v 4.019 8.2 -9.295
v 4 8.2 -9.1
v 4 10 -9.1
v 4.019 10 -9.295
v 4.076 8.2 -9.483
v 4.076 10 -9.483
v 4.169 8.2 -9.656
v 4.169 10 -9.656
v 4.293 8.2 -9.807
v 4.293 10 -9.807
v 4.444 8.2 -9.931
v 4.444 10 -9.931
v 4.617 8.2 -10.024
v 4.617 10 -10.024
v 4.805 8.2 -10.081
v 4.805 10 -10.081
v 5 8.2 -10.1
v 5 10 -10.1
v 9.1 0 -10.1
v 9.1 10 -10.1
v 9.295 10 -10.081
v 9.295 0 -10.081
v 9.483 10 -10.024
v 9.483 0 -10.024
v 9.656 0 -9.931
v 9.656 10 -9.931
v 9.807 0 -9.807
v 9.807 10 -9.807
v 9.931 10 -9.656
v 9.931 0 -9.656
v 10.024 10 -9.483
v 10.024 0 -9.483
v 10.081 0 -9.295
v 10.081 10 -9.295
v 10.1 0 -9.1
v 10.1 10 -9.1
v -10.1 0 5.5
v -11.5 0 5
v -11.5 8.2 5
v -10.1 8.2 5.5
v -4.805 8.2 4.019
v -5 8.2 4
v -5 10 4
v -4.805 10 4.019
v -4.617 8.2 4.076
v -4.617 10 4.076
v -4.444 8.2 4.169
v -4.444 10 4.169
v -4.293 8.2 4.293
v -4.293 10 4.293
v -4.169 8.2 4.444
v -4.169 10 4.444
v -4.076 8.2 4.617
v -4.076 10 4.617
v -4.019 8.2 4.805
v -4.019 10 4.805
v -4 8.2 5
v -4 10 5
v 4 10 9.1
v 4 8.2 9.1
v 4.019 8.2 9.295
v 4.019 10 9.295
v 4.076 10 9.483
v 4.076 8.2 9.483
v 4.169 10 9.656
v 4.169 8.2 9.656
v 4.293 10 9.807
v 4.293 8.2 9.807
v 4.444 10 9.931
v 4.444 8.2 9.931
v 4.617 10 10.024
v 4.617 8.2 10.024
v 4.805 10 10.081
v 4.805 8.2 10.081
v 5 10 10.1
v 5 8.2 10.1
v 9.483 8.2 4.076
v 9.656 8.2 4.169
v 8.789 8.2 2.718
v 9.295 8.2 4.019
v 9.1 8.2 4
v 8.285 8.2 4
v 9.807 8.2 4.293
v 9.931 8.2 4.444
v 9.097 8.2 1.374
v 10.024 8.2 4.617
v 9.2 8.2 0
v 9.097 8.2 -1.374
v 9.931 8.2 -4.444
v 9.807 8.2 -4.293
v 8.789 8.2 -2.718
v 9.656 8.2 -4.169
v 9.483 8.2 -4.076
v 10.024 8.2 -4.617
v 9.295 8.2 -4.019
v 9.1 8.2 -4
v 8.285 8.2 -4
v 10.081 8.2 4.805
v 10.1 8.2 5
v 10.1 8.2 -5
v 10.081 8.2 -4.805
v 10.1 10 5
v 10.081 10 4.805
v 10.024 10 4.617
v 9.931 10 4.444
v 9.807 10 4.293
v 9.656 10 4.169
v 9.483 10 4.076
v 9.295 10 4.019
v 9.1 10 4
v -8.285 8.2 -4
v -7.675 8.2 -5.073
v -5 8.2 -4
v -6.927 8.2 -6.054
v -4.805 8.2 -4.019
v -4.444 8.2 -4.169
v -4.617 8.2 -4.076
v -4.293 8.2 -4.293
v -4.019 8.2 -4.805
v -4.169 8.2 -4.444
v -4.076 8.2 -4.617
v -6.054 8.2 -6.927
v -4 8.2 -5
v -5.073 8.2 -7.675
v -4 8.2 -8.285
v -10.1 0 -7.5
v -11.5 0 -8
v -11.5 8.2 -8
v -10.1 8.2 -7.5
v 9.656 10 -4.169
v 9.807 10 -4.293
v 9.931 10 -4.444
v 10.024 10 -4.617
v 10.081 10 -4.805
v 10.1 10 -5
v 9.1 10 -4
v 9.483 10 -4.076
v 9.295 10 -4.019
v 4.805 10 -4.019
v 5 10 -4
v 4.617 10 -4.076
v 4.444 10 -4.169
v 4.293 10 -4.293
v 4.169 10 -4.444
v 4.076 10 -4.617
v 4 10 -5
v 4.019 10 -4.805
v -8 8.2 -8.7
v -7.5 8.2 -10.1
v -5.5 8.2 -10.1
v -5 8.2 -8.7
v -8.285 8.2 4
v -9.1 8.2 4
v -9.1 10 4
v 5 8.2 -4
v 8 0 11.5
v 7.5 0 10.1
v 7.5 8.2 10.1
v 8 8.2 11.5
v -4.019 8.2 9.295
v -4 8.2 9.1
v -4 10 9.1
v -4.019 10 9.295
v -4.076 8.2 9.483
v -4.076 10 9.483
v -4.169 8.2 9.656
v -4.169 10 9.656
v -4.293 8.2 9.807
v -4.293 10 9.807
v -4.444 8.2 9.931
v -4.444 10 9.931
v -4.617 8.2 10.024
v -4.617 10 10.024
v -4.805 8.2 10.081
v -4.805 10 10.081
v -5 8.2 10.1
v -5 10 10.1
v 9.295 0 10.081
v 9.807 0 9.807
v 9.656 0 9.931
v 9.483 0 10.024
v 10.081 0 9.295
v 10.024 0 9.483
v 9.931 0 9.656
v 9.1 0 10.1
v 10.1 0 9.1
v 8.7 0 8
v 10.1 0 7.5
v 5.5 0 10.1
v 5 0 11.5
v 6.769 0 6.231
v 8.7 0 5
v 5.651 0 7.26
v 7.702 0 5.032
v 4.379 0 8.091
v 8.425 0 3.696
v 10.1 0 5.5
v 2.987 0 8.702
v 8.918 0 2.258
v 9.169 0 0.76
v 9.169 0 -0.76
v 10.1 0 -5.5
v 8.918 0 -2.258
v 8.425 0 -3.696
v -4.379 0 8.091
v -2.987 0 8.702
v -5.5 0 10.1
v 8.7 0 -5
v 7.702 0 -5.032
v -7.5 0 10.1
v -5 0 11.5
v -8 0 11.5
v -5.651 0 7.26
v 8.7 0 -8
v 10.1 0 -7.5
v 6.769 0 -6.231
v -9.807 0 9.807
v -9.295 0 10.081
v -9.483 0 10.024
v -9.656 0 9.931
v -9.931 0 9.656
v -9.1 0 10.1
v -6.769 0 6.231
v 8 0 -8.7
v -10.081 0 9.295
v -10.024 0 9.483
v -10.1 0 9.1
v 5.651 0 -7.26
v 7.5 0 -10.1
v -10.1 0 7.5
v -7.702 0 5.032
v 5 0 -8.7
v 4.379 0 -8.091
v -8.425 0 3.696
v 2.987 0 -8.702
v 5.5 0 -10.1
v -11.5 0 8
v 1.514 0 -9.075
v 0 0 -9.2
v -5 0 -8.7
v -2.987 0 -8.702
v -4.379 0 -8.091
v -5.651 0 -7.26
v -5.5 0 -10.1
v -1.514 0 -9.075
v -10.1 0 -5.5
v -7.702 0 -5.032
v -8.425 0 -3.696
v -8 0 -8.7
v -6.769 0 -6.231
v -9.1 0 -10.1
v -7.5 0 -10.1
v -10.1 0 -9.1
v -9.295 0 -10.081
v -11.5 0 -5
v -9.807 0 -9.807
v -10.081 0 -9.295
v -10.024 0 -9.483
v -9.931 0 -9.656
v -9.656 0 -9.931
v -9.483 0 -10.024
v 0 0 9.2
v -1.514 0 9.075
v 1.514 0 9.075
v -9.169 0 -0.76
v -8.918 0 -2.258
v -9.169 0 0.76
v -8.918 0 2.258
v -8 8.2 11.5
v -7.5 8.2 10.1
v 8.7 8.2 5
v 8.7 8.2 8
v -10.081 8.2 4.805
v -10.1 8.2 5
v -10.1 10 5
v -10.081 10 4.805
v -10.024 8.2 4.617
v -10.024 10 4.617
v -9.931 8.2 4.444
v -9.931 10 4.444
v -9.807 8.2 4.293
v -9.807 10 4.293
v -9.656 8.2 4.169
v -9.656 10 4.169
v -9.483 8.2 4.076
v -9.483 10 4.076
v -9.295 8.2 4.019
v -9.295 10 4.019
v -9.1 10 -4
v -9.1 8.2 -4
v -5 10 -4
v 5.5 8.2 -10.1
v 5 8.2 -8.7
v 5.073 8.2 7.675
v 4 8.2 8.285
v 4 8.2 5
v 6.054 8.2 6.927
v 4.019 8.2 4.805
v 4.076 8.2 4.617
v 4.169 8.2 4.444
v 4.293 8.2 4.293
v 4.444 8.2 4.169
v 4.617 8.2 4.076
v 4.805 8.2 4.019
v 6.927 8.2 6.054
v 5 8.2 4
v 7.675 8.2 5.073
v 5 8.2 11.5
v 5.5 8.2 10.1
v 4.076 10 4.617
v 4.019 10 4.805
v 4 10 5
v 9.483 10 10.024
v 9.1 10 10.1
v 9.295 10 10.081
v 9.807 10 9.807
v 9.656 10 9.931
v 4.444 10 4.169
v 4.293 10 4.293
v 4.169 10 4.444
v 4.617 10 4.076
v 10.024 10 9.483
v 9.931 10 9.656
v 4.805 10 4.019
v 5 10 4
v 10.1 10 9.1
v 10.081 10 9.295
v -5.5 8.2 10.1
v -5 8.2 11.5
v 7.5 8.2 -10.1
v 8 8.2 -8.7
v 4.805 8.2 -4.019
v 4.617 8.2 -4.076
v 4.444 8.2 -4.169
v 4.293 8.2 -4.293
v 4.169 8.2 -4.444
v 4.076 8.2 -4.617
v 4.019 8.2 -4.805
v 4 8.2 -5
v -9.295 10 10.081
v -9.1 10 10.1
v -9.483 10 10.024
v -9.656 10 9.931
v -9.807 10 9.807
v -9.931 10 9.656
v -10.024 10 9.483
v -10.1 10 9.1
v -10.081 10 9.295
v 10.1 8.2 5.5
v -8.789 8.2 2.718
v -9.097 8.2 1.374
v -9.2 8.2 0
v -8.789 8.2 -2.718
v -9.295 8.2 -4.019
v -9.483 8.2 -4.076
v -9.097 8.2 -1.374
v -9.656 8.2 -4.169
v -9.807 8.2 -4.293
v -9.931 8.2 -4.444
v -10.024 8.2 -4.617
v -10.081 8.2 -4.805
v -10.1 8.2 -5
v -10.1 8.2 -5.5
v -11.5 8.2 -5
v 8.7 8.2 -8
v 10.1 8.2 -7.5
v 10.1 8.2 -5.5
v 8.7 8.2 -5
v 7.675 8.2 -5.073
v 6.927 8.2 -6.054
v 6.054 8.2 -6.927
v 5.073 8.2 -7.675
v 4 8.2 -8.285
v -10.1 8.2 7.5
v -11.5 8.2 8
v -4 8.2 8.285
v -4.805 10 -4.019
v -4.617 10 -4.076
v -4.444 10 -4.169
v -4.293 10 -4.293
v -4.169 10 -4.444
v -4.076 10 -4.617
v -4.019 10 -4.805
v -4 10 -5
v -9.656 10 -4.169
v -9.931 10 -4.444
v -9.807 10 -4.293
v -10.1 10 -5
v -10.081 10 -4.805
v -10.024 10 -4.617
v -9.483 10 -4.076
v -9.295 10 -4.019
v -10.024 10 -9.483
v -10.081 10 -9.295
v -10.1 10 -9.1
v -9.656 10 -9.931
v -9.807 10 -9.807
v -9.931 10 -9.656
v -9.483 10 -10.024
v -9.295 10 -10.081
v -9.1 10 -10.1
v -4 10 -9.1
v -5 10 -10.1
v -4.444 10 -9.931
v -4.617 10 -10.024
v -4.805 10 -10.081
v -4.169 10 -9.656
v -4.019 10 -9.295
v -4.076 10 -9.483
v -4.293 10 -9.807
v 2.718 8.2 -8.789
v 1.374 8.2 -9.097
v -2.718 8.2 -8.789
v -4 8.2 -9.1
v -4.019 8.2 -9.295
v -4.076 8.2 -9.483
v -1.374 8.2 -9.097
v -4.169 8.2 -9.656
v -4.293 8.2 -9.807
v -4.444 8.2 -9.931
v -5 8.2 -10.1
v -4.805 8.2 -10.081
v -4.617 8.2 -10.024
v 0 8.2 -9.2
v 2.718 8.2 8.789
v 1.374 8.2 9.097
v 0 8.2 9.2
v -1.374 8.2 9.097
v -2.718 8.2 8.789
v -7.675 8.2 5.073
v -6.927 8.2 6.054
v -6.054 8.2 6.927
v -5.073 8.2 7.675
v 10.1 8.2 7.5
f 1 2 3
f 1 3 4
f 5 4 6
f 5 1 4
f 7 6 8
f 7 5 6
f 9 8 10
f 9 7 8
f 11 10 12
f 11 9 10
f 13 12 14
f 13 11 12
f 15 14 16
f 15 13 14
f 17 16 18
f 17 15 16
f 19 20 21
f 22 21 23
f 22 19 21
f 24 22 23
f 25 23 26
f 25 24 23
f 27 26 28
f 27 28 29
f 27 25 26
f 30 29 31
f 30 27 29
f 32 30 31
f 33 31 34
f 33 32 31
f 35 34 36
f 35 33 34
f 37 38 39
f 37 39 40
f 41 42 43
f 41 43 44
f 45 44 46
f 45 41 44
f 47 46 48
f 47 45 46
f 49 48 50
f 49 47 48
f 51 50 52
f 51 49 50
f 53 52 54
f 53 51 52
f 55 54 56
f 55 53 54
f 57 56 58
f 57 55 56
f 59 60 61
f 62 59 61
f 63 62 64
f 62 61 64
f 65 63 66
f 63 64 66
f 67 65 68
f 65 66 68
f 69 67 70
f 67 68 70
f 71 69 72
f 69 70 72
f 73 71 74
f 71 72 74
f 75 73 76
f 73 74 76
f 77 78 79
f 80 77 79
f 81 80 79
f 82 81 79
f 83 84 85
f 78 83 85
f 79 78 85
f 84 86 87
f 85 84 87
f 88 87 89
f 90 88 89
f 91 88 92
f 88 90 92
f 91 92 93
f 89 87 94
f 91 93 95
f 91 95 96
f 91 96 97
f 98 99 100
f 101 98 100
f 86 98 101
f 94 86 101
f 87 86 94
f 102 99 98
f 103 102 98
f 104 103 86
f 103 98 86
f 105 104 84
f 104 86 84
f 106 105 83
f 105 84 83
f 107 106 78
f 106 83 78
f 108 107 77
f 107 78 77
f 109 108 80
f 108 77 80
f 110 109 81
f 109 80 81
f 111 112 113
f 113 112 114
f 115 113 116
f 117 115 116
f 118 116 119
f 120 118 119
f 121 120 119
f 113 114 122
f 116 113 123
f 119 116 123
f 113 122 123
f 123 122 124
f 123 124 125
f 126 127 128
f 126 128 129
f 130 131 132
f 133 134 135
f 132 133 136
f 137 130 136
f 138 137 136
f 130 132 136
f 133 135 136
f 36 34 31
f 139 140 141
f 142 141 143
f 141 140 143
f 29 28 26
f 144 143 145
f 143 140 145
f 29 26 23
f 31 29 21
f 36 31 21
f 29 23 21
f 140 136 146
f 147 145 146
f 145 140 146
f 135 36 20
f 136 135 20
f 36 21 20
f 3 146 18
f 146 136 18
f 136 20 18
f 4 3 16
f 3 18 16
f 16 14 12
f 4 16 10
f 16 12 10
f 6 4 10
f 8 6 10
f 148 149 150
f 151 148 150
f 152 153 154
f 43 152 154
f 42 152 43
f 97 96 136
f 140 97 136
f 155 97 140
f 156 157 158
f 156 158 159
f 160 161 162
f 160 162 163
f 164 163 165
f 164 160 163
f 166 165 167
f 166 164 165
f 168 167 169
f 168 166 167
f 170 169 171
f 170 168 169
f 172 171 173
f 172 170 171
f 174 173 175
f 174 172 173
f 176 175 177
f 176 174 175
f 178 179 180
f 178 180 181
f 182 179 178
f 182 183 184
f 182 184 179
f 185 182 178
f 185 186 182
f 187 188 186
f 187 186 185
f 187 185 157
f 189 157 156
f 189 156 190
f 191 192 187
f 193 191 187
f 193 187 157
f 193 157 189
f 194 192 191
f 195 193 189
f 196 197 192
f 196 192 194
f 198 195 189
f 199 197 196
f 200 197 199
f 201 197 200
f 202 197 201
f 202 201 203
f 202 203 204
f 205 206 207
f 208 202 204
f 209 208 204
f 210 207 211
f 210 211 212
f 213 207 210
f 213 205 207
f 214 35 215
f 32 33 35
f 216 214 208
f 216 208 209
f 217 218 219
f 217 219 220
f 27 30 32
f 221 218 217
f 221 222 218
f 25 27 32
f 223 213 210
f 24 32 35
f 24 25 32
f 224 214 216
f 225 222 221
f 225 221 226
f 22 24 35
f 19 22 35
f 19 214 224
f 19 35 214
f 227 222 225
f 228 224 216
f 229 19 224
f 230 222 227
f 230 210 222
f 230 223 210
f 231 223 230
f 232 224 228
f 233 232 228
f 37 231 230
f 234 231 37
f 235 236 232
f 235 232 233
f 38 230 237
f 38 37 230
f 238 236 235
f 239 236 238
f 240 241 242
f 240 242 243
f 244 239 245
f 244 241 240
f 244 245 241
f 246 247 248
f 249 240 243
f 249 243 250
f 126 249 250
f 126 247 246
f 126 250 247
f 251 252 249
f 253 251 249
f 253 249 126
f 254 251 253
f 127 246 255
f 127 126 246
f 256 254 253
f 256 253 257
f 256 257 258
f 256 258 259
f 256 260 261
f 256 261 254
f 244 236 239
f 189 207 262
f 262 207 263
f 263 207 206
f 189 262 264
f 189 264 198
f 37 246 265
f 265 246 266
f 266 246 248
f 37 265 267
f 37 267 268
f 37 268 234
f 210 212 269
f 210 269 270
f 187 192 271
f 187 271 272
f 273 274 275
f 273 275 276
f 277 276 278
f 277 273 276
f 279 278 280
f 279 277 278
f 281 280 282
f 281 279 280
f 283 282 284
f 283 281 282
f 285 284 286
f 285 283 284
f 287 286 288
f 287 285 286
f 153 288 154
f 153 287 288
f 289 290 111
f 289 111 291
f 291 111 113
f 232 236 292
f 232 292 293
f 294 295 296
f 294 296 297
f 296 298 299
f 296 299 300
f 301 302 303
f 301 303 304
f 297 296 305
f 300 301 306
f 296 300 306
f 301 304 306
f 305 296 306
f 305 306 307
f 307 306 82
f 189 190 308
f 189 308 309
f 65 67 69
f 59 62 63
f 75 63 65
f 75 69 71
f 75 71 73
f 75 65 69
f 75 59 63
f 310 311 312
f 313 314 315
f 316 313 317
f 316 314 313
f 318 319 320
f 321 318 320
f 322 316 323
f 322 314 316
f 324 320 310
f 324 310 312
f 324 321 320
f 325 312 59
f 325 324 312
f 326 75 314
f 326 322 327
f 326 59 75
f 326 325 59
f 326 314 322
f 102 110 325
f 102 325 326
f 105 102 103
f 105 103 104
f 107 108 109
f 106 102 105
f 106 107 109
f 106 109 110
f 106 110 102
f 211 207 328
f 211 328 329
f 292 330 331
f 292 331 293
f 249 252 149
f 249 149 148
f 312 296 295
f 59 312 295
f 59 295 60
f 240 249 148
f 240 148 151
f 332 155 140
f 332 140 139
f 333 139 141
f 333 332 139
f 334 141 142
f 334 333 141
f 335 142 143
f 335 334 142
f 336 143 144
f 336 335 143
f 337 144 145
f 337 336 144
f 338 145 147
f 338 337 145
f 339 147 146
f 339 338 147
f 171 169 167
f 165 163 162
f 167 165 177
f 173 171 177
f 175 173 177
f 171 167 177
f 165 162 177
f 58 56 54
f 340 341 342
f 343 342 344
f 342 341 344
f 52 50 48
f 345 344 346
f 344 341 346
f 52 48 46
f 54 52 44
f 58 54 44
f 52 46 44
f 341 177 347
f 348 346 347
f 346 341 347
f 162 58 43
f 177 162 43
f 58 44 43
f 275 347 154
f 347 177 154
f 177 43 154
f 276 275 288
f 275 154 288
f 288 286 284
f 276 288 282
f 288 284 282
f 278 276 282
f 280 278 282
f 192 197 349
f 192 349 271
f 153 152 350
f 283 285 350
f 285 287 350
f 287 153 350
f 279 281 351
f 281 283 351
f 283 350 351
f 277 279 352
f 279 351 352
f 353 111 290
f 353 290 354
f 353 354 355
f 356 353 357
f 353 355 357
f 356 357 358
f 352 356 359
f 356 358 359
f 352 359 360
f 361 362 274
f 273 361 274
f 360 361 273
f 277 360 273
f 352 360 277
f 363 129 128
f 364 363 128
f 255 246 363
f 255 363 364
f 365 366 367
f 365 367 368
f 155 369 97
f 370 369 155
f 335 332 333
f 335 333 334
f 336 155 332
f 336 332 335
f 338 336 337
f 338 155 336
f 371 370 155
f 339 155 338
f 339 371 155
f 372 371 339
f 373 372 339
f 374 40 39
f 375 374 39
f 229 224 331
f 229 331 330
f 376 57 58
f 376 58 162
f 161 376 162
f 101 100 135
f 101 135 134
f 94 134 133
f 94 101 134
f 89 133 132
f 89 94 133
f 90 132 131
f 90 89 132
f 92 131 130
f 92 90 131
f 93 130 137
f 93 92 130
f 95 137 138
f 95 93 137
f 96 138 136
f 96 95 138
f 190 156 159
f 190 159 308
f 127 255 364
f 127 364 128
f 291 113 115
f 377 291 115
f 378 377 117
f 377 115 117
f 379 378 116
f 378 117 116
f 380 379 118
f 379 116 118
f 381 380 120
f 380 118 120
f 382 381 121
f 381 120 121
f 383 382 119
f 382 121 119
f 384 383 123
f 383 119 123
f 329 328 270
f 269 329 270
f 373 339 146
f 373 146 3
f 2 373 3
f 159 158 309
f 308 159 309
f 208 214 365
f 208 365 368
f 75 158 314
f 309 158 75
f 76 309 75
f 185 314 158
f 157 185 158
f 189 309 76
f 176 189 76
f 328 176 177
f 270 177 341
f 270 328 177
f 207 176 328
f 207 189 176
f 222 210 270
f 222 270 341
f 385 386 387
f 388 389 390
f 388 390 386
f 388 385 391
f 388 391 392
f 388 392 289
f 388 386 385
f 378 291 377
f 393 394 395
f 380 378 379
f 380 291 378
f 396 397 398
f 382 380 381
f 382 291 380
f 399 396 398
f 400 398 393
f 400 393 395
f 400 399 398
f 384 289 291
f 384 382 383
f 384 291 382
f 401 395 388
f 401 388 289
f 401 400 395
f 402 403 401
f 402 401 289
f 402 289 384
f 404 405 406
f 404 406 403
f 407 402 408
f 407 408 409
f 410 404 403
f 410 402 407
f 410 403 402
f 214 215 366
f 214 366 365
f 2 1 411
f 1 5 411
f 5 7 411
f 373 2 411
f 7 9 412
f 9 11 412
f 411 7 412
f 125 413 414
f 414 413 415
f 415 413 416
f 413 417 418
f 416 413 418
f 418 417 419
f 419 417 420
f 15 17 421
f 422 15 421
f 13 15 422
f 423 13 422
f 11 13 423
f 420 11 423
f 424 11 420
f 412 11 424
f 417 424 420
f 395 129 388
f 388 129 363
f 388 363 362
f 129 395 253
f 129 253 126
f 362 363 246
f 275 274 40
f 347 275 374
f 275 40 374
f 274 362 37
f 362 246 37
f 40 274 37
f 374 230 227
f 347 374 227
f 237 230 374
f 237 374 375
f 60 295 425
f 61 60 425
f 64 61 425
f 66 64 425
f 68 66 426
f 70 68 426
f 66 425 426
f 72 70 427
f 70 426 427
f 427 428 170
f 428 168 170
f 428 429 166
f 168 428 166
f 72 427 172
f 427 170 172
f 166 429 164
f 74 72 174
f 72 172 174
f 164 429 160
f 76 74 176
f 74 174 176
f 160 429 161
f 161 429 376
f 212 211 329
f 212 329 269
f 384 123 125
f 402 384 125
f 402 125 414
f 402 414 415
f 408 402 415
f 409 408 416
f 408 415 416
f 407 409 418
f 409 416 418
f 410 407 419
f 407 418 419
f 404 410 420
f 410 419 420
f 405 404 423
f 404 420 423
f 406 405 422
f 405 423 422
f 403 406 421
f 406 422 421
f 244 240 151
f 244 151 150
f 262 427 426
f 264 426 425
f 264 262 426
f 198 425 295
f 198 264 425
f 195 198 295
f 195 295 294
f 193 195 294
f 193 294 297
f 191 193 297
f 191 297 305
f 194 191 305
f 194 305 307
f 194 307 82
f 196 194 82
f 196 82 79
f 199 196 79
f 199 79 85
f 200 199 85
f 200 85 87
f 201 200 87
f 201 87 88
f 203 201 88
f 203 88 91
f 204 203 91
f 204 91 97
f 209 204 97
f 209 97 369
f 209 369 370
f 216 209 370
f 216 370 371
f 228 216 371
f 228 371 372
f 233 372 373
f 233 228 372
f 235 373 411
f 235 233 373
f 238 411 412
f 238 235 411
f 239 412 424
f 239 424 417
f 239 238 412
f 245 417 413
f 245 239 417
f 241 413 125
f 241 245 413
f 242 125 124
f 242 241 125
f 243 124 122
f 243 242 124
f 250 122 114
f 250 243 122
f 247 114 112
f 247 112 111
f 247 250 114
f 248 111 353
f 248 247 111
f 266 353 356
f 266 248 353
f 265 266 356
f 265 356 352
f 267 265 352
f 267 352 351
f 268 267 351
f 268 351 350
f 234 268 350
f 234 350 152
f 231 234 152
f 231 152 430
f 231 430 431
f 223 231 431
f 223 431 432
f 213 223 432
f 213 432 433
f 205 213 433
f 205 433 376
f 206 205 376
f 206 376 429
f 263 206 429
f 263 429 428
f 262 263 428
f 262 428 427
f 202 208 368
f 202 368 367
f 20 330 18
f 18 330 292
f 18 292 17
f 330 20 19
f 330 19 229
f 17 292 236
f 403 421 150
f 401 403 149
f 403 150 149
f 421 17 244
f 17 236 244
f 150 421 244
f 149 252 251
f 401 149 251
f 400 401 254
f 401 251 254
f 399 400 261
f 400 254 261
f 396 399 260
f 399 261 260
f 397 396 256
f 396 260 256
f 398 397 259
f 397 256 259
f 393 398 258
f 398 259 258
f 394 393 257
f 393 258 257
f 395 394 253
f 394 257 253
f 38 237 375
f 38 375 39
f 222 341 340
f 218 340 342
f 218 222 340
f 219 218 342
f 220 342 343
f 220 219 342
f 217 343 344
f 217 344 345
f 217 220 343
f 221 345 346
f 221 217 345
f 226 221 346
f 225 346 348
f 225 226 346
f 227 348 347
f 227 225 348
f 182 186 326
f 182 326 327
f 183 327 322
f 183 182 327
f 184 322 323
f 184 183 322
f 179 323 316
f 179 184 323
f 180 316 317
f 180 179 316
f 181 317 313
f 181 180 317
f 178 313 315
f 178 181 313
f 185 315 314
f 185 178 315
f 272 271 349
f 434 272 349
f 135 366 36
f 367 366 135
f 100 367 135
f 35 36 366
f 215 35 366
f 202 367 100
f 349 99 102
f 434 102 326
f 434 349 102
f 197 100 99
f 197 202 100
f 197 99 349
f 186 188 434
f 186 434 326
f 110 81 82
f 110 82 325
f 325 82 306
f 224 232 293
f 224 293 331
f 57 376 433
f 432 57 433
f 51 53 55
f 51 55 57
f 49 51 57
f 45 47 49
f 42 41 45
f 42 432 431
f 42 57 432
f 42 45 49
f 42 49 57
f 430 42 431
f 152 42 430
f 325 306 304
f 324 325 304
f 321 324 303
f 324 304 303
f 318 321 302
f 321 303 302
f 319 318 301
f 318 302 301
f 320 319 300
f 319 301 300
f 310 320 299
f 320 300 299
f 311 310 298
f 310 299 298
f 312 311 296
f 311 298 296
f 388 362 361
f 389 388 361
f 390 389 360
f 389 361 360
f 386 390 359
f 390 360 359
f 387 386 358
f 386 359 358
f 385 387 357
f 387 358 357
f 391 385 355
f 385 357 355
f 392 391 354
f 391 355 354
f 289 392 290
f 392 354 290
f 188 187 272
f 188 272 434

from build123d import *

# Parameters (mm, degrees)
SKETCH1_R           = 9.2
BOSS_EXTRUDE1_DEPTH = 8.2
BOSS_EXTRUDE2_DEPTH = 1.8


with BuildPart() as part:
    # Sketch1 → Boss-Extrude1 (new body)
    with BuildSketch(Plane(origin=(0, 0, 0), x_dir=(1, 0, 0), z_dir=(0, 1, 0))):
        with BuildLine():
            Line((-9.1, 10.1), (-7.5, 10.1))
            Line((-7.5, 10.1), (-8, 8.7))
            Line((-8, 8.7), (-5, 8.7))
            Line((-5, 8.7), (-5.5, 10.1))
            Line((-5.5, 10.1), (5.5, 10.1))
            Line((5.5, 10.1), (5, 8.7))
            Line((5, 8.7), (8, 8.7))
            Line((8, 8.7), (7.5, 10.1))
            Line((7.5, 10.1), (9.1, 10.1))
            ThreePointArc((9.1, 10.1), (9.807106781, 9.807106781), (10.1, 9.1))
            Line((10.1, 9.1), (10.1, 7.5))
            Line((10.1, 7.5), (8.7, 8))
            Line((8.7, 8), (8.7, 5))
            Line((8.7, 5), (10.1, 5.5))
            Line((10.1, 5.5), (10.1, -5.5))
            Line((10.1, -5.5), (8.7, -5))
            Line((8.7, -5), (8.7, -8))
            Line((8.7, -8), (10.1, -7.5))
            Line((10.1, -7.5), (10.1, -9.1))
            ThreePointArc((10.1, -9.1), (9.807106781, -9.807106781), (9.1, -10.1))
            Line((9.1, -10.1), (7.5, -10.1))
            Line((7.5, -10.1), (8, -11.5))
            Line((8, -11.5), (5, -11.5))
            Line((5, -11.5), (5.5, -10.1))
            Line((5.5, -10.1), (-5.5, -10.1))
            Line((-5.5, -10.1), (-5, -11.5))
            Line((-5, -11.5), (-8, -11.5))
            Line((-8, -11.5), (-7.5, -10.1))
            Line((-7.5, -10.1), (-9.1, -10.1))
            ThreePointArc((-9.1, -10.1), (-9.807106781, -9.807106781), (-10.1, -9.1))
            Line((-10.1, -9.1), (-10.1, -7.5))
            Line((-10.1, -7.5), (-11.5, -8))
            Line((-11.5, -8), (-11.5, -5))
            Line((-11.5, -5), (-10.1, -5.5))
            Line((-10.1, -5.5), (-10.1, 5.5))
            Line((-10.1, 5.5), (-11.5, 5))
            Line((-11.5, 5), (-11.5, 8))
            Line((-11.5, 8), (-10.1, 7.5))
            Line((-10.1, 7.5), (-10.1, 9.1))
            ThreePointArc((-10.1, 9.1), (-9.807106781, 9.807106781), (-9.1, 10.1))
        make_face()
        with Locations(Location((0, 0, 0), (0, 0, 270))):
            Circle(SKETCH1_R, mode=Mode.SUBTRACT)
    extrude(amount=BOSS_EXTRUDE1_DEPTH)

    # Sketch2 → Boss-Extrude2 (add)
    with BuildSketch(Plane(origin=(0, 8.2, 0), x_dir=(1, 0, 0), z_dir=(0, 1, 0))):
        with BuildLine():
            Line((-9.1, 4), (-5, 4))
            ThreePointArc((-5, 4), (-4.292893219, 4.292893219), (-4, 5))
            Line((-4, 5), (-4, 9.1))
            ThreePointArc((-4, 9.1), (-4.292893219, 9.807106781), (-5, 10.1))
            Line((-5, 10.1), (-9.1, 10.1))
            ThreePointArc((-9.1, 10.1), (-9.807106781, 9.807106781), (-10.1, 9.1))
            Line((-10.1, 9.1), (-10.1, 5))
            ThreePointArc((-10.1, 5), (-9.807106781, 4.292893219), (-9.1, 4))
        make_face()
        with BuildLine():
            Line((10.1, 9.1), (10.1, 5))
            ThreePointArc((10.1, 5), (9.807106781, 4.292893219), (9.1, 4))
            Line((9.1, 4), (5, 4))
            ThreePointArc((5, 4), (4.292893219, 4.292893219), (4, 5))
            Line((4, 5), (4, 9.1))
            ThreePointArc((4, 9.1), (4.292893219, 9.807106781), (5, 10.1))
            Line((5, 10.1), (9.1, 10.1))
            ThreePointArc((9.1, 10.1), (9.807106781, 9.807106781), (10.1, 9.1))
        make_face()
        with BuildLine():
            Line((9.1, -4), (5, -4))
            ThreePointArc((5, -4), (4.292893219, -4.292893219), (4, -5))
            Line((4, -5), (4, -9.1))
            ThreePointArc((4, -9.1), (4.292893219, -9.807106781), (5, -10.1))
            Line((5, -10.1), (9.1, -10.1))
            ThreePointArc((9.1, -10.1), (9.807106781, -9.807106781), (10.1, -9.1))
            Line((10.1, -9.1), (10.1, -5))
            ThreePointArc((10.1, -5), (9.807106781, -4.292893219), (9.1, -4))
        make_face()
        with BuildLine():
            Line((-4, -5), (-4, -9.1))
            ThreePointArc((-4, -9.1), (-4.292893219, -9.807106781), (-5, -10.1))
            Line((-5, -10.1), (-9.1, -10.1))
            ThreePointArc((-9.1, -10.1), (-9.807106781, -9.807106781), (-10.1, -9.1))
            Line((-10.1, -9.1), (-10.1, -5))
            ThreePointArc((-10.1, -5), (-9.807106781, -4.292893219), (-9.1, -4))
            Line((-9.1, -4), (-5, -4))
            ThreePointArc((-5, -4), (-4.292893219, -4.292893219), (-4, -5))
        make_face()
    extrude(amount=BOSS_EXTRUDE2_DEPTH)


solid = part.part
